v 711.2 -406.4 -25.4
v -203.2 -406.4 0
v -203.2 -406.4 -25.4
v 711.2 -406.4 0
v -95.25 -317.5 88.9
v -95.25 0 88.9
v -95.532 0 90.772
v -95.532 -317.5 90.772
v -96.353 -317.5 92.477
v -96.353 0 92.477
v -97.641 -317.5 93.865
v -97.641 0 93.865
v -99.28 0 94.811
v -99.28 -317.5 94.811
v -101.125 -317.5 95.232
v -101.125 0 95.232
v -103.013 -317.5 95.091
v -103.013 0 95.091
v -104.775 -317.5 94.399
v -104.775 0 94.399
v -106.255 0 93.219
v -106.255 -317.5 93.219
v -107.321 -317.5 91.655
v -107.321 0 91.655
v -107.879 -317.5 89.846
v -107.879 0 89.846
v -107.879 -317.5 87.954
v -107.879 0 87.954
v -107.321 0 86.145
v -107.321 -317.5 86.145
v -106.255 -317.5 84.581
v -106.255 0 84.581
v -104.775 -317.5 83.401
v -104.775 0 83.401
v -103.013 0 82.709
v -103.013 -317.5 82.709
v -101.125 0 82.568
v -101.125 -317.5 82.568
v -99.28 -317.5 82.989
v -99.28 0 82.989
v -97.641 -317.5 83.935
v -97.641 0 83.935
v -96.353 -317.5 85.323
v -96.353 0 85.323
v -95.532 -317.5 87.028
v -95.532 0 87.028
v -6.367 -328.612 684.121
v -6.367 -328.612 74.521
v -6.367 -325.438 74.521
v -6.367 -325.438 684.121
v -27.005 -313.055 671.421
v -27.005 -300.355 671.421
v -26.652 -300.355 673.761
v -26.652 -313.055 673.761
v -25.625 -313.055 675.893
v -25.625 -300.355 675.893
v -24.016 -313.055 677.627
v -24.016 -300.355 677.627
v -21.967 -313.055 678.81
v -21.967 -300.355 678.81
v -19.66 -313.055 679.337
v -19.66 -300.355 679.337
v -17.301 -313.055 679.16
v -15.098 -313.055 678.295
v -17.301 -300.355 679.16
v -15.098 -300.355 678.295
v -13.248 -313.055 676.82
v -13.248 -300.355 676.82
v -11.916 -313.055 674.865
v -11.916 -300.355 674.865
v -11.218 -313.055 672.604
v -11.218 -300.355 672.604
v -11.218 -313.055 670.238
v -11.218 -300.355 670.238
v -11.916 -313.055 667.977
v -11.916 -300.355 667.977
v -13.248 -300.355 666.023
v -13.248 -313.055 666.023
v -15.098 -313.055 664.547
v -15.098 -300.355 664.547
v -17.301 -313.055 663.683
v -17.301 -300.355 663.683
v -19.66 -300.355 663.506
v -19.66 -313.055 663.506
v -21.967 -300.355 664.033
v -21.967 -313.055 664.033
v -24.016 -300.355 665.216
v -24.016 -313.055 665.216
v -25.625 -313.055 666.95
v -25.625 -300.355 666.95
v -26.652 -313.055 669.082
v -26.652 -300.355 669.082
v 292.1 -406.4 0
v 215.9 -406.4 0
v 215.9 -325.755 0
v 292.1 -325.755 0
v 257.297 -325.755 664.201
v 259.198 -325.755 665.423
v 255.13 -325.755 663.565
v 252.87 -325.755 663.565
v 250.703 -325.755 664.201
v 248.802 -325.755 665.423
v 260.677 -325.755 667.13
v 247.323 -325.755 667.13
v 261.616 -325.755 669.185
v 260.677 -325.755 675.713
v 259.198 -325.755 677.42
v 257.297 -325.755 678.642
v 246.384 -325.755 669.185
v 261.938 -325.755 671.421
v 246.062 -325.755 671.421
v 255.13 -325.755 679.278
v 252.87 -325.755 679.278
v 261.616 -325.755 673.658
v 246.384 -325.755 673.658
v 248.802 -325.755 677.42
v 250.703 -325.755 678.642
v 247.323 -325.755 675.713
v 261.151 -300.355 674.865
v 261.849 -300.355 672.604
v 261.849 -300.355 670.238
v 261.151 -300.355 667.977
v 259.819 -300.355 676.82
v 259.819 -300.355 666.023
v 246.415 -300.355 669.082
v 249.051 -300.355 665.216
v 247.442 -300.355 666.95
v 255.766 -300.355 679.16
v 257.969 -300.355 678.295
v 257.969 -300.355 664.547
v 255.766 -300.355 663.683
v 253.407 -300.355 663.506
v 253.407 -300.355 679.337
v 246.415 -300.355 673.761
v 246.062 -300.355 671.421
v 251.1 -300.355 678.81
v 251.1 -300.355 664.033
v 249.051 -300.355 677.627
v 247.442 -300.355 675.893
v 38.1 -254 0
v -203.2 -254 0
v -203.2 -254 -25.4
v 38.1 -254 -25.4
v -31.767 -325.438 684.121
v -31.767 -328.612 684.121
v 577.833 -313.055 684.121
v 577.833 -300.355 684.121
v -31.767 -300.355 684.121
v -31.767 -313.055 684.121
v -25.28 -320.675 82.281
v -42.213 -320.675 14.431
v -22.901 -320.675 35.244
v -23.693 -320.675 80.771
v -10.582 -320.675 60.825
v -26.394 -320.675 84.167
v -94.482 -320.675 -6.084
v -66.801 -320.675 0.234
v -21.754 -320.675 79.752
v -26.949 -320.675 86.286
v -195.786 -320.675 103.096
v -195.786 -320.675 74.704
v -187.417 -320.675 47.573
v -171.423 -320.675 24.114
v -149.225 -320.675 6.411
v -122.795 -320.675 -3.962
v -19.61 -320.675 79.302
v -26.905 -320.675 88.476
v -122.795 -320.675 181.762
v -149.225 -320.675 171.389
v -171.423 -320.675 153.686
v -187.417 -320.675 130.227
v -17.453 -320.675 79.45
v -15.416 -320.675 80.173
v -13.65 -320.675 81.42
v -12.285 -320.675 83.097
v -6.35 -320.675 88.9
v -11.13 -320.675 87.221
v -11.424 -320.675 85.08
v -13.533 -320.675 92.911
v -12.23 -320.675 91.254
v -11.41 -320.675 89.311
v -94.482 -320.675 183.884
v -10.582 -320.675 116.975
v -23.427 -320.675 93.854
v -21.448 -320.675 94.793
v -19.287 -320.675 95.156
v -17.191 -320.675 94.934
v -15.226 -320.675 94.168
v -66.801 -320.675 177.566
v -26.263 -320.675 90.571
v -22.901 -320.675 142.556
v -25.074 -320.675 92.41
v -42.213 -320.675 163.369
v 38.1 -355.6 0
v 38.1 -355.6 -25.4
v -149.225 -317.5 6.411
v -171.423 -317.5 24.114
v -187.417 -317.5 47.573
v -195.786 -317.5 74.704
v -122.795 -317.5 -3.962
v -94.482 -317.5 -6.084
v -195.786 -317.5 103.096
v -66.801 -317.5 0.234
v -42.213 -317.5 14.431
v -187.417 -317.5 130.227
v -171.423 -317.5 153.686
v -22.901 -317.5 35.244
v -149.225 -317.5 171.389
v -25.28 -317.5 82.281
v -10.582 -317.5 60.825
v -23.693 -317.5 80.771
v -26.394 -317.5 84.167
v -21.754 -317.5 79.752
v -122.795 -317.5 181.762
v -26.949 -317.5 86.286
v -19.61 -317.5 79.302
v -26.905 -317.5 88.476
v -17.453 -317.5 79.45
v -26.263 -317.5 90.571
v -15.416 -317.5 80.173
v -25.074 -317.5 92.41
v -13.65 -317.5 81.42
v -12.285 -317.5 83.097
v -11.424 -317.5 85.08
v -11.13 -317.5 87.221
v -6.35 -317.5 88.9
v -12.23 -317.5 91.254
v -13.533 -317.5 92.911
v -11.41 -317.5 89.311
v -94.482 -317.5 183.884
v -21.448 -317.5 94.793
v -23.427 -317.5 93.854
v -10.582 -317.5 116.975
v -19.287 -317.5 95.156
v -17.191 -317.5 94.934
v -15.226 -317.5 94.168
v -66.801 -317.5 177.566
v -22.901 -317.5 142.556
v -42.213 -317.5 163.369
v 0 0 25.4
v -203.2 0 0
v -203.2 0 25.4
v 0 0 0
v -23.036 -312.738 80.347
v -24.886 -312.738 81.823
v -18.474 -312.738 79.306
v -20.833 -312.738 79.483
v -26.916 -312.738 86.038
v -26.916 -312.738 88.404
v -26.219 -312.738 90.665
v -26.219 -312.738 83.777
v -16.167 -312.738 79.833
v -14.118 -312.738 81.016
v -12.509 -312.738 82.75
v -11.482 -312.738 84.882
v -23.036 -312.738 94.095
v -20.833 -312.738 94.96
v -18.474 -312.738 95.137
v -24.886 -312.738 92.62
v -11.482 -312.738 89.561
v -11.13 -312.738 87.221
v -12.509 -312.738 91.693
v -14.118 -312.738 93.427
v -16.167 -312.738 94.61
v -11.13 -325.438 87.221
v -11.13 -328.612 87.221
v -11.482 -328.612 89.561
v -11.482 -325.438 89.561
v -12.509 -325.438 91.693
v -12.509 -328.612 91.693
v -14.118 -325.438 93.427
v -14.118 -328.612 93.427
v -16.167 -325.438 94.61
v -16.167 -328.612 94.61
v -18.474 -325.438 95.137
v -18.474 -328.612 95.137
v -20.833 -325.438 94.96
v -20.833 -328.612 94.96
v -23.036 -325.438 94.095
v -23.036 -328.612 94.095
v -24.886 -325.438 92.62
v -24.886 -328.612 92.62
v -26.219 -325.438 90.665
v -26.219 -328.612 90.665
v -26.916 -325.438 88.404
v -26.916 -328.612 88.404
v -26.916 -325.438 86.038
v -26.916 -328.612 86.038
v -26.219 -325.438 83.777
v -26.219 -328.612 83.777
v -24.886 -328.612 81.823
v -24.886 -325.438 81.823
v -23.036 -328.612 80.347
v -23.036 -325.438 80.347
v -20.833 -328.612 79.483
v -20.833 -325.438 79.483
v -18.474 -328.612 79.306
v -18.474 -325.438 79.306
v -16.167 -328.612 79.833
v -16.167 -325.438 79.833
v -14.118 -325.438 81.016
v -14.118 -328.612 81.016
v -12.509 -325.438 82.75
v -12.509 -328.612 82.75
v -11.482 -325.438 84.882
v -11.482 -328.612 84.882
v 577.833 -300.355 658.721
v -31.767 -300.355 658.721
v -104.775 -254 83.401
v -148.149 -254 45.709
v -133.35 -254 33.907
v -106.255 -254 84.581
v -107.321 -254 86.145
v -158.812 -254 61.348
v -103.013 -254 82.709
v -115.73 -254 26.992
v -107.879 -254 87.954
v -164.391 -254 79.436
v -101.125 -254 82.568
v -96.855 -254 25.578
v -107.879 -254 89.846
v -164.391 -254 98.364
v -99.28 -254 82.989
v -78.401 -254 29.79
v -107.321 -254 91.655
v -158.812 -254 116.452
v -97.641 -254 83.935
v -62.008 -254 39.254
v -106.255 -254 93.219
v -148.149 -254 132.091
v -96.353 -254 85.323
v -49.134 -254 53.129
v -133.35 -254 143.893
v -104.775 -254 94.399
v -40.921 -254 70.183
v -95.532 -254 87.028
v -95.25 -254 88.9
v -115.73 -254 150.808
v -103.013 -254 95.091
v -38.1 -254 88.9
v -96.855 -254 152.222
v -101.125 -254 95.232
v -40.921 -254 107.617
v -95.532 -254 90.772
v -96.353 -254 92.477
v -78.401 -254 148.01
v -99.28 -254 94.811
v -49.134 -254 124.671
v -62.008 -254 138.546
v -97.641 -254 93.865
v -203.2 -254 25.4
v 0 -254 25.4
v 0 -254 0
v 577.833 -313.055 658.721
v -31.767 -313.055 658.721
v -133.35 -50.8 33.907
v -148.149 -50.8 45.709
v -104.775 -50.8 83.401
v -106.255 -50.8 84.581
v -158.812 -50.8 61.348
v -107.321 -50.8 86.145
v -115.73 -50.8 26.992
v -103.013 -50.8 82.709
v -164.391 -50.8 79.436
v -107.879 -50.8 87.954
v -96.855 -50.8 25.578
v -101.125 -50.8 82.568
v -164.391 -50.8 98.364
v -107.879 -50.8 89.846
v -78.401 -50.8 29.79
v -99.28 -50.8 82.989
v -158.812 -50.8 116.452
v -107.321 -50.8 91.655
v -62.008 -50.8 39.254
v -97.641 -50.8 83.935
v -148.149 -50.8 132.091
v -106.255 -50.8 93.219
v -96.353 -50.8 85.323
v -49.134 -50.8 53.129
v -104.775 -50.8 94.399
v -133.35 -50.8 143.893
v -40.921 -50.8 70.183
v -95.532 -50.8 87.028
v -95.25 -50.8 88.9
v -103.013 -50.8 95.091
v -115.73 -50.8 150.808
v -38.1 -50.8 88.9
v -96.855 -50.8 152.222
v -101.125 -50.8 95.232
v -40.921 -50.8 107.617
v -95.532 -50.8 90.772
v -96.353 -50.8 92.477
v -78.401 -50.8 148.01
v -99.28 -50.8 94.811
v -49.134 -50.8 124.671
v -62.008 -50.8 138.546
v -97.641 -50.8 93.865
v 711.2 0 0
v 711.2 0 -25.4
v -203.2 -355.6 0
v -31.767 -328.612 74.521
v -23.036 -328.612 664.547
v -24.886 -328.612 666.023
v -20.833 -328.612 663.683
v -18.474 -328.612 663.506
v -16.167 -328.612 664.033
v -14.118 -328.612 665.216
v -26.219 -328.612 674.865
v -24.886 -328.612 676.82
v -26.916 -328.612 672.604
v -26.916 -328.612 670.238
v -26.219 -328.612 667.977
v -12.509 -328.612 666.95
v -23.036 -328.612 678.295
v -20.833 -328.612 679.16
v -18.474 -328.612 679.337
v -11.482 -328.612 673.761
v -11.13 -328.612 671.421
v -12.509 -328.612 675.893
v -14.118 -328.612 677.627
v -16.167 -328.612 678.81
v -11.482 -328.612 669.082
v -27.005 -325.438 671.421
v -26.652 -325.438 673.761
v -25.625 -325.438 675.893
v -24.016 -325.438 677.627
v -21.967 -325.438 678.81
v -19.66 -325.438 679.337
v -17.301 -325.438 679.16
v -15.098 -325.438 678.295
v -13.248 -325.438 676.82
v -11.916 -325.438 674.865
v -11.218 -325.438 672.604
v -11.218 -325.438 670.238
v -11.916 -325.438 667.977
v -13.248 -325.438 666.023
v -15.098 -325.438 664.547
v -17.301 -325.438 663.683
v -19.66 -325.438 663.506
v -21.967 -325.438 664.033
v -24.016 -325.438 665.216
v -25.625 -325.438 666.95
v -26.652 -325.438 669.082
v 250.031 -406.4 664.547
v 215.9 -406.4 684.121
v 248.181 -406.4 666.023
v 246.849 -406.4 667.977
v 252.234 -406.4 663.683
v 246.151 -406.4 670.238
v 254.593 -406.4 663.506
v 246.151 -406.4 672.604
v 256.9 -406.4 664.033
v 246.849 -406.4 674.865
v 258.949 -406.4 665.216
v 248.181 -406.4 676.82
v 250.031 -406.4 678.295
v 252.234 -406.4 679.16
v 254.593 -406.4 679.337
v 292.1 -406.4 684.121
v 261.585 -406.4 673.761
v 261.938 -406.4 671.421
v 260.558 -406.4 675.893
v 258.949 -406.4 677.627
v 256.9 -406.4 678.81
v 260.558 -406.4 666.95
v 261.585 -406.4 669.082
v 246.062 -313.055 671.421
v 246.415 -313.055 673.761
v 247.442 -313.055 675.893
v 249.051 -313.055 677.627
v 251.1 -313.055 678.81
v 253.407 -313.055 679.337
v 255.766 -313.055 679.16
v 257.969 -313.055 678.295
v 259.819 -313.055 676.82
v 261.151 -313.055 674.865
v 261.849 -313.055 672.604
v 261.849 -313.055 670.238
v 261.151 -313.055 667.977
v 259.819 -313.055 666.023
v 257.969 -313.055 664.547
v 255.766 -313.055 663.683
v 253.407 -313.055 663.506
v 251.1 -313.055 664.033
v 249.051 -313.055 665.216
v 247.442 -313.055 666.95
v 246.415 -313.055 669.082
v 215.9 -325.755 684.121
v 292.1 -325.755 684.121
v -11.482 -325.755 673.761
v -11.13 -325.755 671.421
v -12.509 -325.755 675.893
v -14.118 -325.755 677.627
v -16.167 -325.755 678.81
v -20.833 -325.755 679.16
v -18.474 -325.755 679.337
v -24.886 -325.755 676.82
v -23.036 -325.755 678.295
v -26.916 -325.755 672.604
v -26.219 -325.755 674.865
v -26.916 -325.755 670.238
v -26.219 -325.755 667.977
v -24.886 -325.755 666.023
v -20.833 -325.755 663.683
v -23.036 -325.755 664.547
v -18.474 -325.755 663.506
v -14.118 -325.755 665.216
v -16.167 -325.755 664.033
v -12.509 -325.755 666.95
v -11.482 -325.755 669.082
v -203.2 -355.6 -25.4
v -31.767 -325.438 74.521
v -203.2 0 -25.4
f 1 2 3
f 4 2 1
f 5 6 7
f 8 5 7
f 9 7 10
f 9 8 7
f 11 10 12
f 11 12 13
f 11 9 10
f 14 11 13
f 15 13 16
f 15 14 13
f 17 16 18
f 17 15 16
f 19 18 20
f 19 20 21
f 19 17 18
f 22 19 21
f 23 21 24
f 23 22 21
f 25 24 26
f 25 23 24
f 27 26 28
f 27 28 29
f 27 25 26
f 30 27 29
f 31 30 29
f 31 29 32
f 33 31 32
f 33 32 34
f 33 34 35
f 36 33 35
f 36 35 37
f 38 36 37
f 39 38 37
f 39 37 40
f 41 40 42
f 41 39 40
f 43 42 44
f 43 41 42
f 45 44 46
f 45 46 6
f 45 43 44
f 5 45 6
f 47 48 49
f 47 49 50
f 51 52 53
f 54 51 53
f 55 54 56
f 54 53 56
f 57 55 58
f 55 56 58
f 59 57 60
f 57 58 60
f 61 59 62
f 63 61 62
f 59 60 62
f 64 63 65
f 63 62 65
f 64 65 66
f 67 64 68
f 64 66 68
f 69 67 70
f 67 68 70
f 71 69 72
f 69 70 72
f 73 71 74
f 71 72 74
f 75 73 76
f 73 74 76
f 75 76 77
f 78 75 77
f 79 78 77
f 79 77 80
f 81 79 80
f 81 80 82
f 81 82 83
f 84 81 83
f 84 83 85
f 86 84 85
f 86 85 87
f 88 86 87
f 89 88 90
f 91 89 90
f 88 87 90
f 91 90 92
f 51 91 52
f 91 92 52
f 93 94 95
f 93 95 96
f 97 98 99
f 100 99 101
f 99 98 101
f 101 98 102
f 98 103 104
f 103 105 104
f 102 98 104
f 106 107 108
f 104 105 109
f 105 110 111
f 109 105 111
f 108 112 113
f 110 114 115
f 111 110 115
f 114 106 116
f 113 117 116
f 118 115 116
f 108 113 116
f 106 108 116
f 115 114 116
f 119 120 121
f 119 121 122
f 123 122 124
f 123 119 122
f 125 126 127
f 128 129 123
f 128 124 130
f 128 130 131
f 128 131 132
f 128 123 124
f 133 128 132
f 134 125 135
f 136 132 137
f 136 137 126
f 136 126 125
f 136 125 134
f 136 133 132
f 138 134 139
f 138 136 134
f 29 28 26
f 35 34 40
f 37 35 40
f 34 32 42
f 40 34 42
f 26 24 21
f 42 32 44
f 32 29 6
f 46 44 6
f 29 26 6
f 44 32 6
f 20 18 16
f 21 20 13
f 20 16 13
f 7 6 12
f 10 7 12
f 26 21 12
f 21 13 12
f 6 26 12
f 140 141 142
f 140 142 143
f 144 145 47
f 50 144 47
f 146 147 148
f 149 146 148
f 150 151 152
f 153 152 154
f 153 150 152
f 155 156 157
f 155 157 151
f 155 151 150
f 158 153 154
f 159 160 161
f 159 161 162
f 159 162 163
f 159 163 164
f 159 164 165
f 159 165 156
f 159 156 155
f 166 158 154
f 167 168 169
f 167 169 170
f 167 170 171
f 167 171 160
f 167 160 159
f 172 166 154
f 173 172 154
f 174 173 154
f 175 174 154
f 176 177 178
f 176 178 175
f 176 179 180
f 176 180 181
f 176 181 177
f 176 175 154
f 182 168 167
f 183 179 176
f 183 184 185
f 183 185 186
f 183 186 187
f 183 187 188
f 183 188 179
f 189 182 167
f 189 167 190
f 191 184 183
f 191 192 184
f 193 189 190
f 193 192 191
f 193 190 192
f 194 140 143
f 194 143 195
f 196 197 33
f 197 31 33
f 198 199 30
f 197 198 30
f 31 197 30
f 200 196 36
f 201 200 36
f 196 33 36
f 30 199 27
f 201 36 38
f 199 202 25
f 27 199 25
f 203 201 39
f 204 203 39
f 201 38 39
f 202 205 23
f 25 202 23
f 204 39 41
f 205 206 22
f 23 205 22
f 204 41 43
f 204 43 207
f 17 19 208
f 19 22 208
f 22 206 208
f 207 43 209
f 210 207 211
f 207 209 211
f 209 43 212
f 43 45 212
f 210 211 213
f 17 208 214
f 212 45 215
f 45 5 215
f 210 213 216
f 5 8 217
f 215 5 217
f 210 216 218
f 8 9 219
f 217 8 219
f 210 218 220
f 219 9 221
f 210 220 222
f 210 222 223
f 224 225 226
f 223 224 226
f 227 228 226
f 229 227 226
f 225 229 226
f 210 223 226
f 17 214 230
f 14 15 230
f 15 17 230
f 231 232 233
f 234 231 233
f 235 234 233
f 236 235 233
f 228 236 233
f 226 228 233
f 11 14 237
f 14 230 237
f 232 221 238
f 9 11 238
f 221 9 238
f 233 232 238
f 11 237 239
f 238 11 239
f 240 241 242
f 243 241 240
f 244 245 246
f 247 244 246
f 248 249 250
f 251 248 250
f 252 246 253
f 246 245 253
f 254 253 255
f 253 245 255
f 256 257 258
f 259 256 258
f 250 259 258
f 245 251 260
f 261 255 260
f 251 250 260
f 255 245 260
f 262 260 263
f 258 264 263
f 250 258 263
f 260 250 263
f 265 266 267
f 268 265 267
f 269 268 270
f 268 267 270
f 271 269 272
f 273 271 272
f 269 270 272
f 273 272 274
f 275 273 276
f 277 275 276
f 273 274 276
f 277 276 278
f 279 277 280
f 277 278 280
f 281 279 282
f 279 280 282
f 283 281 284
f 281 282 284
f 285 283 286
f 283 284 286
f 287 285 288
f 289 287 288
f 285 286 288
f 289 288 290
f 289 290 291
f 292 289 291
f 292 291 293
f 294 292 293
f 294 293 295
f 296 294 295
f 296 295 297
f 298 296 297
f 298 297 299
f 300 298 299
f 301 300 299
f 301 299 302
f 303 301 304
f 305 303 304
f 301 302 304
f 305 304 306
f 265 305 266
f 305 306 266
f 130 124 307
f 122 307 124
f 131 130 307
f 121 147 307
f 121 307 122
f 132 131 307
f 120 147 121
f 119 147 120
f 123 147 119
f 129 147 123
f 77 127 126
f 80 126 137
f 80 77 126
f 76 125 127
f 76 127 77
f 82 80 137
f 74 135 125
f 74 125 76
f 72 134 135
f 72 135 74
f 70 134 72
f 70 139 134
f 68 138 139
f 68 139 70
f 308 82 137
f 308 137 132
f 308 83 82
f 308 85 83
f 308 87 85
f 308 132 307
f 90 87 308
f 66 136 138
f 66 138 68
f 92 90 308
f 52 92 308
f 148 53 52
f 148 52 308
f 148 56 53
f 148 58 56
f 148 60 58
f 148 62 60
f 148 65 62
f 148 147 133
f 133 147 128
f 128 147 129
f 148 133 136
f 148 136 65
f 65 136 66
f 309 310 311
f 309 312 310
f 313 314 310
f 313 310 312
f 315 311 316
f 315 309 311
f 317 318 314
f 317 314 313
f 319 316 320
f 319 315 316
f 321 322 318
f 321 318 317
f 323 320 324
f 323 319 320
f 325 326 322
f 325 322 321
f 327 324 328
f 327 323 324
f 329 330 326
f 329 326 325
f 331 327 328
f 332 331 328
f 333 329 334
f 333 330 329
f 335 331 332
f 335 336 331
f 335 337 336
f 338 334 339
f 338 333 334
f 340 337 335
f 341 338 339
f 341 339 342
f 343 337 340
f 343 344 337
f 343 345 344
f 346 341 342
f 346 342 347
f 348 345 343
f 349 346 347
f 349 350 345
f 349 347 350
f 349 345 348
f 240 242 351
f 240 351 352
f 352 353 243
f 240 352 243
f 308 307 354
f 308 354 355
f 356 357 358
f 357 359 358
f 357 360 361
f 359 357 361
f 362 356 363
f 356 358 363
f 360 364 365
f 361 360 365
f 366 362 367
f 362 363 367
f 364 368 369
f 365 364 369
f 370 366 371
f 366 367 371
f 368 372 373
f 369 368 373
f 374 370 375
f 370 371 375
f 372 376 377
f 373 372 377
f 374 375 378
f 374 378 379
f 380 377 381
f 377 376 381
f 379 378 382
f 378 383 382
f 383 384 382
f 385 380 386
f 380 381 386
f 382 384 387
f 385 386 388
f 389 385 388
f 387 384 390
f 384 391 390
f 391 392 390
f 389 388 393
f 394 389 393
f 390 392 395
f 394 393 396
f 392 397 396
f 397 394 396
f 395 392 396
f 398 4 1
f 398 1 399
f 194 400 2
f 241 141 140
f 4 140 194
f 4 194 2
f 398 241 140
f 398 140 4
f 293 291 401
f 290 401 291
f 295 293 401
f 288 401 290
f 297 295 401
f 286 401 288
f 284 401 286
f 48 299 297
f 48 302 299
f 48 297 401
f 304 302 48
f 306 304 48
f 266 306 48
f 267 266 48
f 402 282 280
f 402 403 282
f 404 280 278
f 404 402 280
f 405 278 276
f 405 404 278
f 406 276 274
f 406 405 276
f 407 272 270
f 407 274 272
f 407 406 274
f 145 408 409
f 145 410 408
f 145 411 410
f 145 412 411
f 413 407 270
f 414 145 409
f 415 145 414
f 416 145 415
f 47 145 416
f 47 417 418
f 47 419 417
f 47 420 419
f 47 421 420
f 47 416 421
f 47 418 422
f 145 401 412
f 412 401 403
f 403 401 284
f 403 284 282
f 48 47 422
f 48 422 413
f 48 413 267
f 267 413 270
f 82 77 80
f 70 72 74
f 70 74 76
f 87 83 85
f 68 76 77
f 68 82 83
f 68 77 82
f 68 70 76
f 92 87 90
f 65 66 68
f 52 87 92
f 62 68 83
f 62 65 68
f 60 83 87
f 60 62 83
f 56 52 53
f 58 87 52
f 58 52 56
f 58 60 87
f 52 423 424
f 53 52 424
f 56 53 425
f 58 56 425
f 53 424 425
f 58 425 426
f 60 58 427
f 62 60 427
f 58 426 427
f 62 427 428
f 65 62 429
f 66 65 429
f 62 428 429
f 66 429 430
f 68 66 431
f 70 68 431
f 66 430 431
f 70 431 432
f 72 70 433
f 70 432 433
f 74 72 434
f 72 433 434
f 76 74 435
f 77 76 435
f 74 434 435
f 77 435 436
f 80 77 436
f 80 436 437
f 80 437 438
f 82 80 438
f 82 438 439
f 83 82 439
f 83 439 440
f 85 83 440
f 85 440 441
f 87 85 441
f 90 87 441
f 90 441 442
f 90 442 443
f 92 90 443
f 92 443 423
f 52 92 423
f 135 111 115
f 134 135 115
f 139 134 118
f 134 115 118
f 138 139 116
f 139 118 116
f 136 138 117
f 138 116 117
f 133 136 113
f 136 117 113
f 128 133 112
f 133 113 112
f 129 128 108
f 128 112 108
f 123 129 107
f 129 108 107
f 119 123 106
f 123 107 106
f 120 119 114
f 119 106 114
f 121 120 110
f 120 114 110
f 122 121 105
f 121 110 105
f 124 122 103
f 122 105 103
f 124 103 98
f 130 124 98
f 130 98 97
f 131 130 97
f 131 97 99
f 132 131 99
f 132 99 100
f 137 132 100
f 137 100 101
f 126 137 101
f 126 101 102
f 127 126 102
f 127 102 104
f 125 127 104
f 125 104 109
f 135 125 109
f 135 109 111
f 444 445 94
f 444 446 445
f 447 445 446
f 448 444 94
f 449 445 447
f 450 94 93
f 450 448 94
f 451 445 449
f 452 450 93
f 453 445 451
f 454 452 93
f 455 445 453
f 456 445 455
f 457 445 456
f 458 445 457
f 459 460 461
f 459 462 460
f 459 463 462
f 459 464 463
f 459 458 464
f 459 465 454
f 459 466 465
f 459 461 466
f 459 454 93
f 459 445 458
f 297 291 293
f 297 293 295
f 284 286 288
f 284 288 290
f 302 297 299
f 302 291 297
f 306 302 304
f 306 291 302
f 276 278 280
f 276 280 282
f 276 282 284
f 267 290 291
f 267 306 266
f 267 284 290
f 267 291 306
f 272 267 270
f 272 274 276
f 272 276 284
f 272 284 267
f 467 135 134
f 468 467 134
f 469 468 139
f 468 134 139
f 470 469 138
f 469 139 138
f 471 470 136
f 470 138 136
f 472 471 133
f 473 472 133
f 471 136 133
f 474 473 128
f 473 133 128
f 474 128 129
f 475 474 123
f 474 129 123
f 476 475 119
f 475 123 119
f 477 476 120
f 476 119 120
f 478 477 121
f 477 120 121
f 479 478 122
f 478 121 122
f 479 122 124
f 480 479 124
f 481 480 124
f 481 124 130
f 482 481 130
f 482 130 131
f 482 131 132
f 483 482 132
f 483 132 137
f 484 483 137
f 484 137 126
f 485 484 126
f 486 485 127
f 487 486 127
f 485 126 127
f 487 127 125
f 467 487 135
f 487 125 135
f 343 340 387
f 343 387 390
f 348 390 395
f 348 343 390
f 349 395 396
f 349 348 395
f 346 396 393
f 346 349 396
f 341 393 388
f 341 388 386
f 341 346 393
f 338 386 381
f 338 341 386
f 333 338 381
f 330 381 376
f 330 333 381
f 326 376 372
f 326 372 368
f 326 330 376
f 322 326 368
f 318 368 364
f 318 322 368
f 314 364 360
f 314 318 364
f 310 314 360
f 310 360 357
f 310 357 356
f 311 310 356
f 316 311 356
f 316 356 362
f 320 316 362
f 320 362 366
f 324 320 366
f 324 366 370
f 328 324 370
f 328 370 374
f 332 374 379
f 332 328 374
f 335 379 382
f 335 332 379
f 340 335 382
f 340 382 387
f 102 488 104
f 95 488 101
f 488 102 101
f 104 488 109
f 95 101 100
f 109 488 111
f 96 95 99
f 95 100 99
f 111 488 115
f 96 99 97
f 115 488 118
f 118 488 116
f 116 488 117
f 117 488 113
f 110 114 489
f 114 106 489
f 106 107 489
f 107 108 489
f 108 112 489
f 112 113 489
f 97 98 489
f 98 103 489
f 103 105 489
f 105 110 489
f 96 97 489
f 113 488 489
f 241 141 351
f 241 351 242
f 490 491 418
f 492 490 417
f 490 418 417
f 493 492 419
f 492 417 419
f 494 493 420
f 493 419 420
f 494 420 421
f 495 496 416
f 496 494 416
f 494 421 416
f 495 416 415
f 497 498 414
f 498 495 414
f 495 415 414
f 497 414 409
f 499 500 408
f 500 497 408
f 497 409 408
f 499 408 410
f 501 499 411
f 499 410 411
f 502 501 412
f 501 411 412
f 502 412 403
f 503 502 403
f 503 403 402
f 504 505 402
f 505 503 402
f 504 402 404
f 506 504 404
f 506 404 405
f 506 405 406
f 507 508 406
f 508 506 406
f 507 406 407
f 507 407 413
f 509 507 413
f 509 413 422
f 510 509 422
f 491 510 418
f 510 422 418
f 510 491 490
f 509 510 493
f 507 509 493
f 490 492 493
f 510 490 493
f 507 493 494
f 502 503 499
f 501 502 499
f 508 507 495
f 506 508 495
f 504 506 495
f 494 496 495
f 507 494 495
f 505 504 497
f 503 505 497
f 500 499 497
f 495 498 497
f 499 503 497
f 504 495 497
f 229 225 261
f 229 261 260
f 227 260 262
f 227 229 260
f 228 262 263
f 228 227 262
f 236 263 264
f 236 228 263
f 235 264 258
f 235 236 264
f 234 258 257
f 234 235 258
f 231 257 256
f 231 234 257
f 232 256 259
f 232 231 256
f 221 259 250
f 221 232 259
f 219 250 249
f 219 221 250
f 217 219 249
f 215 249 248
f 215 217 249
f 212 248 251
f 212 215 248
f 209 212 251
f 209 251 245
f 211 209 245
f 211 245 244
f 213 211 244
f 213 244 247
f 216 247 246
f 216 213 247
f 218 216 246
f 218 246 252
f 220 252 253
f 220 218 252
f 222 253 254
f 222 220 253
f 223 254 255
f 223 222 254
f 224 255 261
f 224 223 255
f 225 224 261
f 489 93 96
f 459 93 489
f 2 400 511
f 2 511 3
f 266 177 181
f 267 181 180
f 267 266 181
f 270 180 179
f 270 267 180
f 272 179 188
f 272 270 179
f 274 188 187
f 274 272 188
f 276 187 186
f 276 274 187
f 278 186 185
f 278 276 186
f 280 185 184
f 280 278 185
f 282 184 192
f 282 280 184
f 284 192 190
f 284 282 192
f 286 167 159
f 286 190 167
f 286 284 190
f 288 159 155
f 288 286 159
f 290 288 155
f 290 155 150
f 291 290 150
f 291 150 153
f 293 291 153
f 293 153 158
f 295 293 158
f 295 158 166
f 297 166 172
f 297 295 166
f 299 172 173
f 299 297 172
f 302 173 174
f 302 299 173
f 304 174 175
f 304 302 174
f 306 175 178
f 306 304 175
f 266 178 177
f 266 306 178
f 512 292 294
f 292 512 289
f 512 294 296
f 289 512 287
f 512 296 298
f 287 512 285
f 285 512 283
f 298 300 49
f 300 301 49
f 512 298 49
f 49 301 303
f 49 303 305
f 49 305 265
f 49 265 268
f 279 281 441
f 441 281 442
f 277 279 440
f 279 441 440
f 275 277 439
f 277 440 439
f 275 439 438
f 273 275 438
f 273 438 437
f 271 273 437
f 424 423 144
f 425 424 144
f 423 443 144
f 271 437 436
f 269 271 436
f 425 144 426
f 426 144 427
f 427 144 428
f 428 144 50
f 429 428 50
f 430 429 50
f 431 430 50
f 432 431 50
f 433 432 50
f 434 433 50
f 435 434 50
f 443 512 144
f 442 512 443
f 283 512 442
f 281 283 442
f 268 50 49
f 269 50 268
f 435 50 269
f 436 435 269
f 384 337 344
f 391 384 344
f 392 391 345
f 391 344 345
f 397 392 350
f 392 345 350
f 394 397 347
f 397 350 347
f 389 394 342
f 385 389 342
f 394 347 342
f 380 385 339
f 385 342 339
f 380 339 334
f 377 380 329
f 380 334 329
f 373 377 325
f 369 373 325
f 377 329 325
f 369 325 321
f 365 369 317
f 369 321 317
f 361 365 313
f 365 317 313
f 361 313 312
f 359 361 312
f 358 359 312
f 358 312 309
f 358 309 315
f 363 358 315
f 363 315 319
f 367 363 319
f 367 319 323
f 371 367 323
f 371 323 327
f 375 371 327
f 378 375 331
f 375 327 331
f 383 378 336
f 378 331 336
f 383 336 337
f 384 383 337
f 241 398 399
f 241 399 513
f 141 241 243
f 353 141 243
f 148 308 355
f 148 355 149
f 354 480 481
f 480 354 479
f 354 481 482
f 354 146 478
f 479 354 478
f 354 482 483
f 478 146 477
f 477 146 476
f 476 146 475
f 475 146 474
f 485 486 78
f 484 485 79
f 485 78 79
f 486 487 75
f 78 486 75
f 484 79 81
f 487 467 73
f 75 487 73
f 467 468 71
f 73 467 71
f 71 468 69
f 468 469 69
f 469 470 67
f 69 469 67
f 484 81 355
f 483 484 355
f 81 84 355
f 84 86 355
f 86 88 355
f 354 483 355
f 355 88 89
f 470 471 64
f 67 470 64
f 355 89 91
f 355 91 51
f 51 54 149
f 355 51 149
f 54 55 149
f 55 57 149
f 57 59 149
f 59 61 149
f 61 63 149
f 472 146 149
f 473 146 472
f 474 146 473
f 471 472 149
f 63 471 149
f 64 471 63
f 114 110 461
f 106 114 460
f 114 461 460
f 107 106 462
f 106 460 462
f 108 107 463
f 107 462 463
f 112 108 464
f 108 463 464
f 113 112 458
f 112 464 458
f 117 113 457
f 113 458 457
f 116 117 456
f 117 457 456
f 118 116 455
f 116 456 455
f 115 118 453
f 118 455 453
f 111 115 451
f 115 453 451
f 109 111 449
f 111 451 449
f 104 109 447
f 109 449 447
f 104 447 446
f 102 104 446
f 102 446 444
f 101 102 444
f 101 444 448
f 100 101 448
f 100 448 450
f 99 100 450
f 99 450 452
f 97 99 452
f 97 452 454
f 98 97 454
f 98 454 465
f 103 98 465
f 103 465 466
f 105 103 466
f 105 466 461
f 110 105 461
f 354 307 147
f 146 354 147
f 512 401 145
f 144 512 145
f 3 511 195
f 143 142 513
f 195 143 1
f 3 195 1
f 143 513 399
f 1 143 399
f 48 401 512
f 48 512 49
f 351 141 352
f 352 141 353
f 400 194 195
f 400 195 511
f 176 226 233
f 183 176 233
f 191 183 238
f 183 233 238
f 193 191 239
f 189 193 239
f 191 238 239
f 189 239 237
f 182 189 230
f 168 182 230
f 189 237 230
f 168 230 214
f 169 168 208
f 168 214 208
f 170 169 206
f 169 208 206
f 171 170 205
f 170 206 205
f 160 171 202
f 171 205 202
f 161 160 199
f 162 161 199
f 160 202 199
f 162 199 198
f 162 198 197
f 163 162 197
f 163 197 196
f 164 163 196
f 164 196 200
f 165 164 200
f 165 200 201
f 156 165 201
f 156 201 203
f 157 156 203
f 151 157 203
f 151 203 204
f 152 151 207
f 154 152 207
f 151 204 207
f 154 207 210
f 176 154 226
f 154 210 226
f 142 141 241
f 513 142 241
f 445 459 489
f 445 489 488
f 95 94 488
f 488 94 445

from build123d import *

# Parameters (mm, degrees)
F0_W          = 203.2
F0_H          = 254
F1_DEPTH      = 25.4
F2_R          = 63.5
F2_R_2        = 6.35
F3_DEPTH      = 203.2
F4_DEPTH      = 63.5
F4_DEPTH_BACK = 254
F5_R          = 95.25
F5_R_2        = 6.35
F6_DEPTH      = 3.175
F7_R          = 7.9375
F8_DEPTH      = 7.9375
F9_W          = 25.4
F9_H          = 609.6
F9_R          = 7.9375
F10_DEPTH     = 3.175
F11_W         = 203.2
F11_H         = 254
F12_DEPTH     = 25.4
F13_W         = 38.1
F13_H         = 684.1214105025
F14_DEPTH     = 80.645
F15_R         = 7.9375
F16_DEPTH     = 80.645
F17_R         = 7.9375
F18_DEPTH     = 25.4
F19_W         = 609.6
F19_H         = 25.4
F19_R         = 7.9375
F20_DEPTH     = 12.7


with BuildPart() as f1:
    # F0 (on Top) → F1 (new body)
    with BuildSketch(Plane.XY):
        with Locations((-101.6, -127)):
            Rectangle(F0_W, F0_H)
    extrude(amount=F1_DEPTH)


with BuildPart() as f3:
    # F2 (on face) → F3 (new body)
    with BuildSketch(Plane.XZ.offset(254)):
        with Locations((-101.6, 88.9)):
            Circle(F2_R)
        with Locations((-101.6, 88.9)):
            Circle(F2_R_2, mode=Mode.SUBTRACT)
    extrude(amount=-F3_DEPTH)


with BuildPart() as f4:
    # F2 (on face) → F4 (new body, two sides)
    with BuildSketch(Plane.XZ.offset(254)) as f4_sk:
        with Locations((-101.6, 88.9)):
            Circle(F2_R_2)
    extrude(amount=F4_DEPTH)
    extrude(f4_sk.sketch, amount=-F4_DEPTH_BACK)

    # F5 (on face) → F6 (join)
    with BuildSketch(Plane.XZ.offset(317.5)):
        with Locations((-101.6, 88.9)):
            Circle(F5_R)
        with BuildLine():
            ThreePointArc((-19.6098160353, 79.3024881643), (-184.1329318351, 90.5785894975), (-19.2873836435, 95.1558523443))
            ThreePointArc((-19.2873836435, 95.1558523443), (-13.5328495146, 92.9114307293), (-11.1295681649, 87.2214105025))
            ThreePointArc((-11.1295681649, 87.2214105025), (-13.6496958762, 81.4200327579), (-19.6098160353, 79.3024881643))
        make_face(mode=Mode.SUBTRACT)
        with BuildLine():
            ThreePointArc((-19.6098160353, 79.3024881643), (-27.0029269952, 87.3828133388), (-19.2873836435, 95.1558523443))
            ThreePointArc((-19.2873836435, 95.1558523443), (-184.1329318351, 90.5785894975), (-19.6098160353, 79.3024881643))
        make_face()
        with Locations((-101.6, 88.9)):
            Circle(F5_R_2, mode=Mode.SUBTRACT)
        with Locations((-101.6, 88.9)):
            Circle(F5_R_2)
    extrude(amount=F6_DEPTH)

    # F7 (on face) → F8 (join, symmetric)
    with BuildSketch(Plane.XZ.offset(320.675)):
        with Locations((-19.0670681649, 87.2214105025)):
            Circle(F7_R)
    extrude(amount=F8_DEPTH, both=True)


with BuildPart() as f10:
    # F9 (on face) → F10 (new body)
    with BuildSketch(Plane.XZ.offset(328.6125)):
        with Locations((-19.0670681649, 379.3214105025)):
            Rectangle(F9_W, F9_H)
        with Locations((-19.0670681649, 87.2214105025)):
            Circle(F9_R, mode=Mode.SUBTRACT)
        with Locations((-19.0670681649, 671.4214105025)):
            Circle(F9_R, mode=Mode.SUBTRACT)
    extrude(amount=-F10_DEPTH)

    # F17 (on face) → F18, piece 2 (join)
    with BuildSketch(Plane(origin=(0, -325.755, 0), x_dir=(-1, 0, 0), z_dir=(0, 1, 0))):
        with Locations((19.0670681649, 671.4214105025)):
            Circle(F17_R)
    extrude(amount=F18_DEPTH)


with BuildPart() as f12:
    # F11 (on face) → F12 (new body)
    with BuildSketch(Plane.XY):
        with Locations((-101.6, -127)):
            Rectangle(F11_W, F11_H)
        Polygon((0, 0), (0, -254), (38.1, -254), (38.1, -355.6), (-203.2, -355.6), (-203.2, -406.4), (711.2, -406.4), (711.2, 0), align=None)
    extrude(amount=-F12_DEPTH)


with BuildPart() as f14:
    # F13 (on face) → F14 (new body)
    with BuildSketch(Plane.XZ.offset(406.4)):
        with Locations((273.05, 342.0607052513)):
            Rectangle(F13_W, F13_H)
        with Locations((234.95, 342.0607052513)):
            Rectangle(F13_W, F13_H)
    extrude(amount=-F14_DEPTH)

    # F15 (on face) → F16 (cut, through all)
    with BuildSketch(Plane.XZ.offset(406.4)):
        with Locations((254, 671.4214105025)):
            Circle(F15_R)
    extrude(amount=-F16_DEPTH, mode=Mode.SUBTRACT)

    # F17 (on face) → F18 (join)
    with BuildSketch(Plane(origin=(0, -325.755, 0), x_dir=(-1, 0, 0), z_dir=(0, 1, 0))):
        with Locations((-254, 671.4214105025)):
            Circle(F17_R)
    extrude(amount=F18_DEPTH)


with BuildPart() as f20:
    # F19 (on face) → F20 (new body)
    with BuildSketch(Plane(origin=(0, -300.355, 0), x_dir=(-1, 0, 0), z_dir=(0, 1, 0))):
        with Locations((-273.0329318351, 671.4214105025)):
            Rectangle(F19_W, F19_H)
        with Locations((-254, 671.4214105025)):
            Circle(F19_R, mode=Mode.SUBTRACT)
        with Locations((19.0670681649, 671.4214105025)):
            Circle(F19_R, mode=Mode.SUBTRACT)
    extrude(amount=-F20_DEPTH)


solid = Compound([f1.part, f3.part, f4.part, f10.part, f12.part, f14.part, f20.part])
